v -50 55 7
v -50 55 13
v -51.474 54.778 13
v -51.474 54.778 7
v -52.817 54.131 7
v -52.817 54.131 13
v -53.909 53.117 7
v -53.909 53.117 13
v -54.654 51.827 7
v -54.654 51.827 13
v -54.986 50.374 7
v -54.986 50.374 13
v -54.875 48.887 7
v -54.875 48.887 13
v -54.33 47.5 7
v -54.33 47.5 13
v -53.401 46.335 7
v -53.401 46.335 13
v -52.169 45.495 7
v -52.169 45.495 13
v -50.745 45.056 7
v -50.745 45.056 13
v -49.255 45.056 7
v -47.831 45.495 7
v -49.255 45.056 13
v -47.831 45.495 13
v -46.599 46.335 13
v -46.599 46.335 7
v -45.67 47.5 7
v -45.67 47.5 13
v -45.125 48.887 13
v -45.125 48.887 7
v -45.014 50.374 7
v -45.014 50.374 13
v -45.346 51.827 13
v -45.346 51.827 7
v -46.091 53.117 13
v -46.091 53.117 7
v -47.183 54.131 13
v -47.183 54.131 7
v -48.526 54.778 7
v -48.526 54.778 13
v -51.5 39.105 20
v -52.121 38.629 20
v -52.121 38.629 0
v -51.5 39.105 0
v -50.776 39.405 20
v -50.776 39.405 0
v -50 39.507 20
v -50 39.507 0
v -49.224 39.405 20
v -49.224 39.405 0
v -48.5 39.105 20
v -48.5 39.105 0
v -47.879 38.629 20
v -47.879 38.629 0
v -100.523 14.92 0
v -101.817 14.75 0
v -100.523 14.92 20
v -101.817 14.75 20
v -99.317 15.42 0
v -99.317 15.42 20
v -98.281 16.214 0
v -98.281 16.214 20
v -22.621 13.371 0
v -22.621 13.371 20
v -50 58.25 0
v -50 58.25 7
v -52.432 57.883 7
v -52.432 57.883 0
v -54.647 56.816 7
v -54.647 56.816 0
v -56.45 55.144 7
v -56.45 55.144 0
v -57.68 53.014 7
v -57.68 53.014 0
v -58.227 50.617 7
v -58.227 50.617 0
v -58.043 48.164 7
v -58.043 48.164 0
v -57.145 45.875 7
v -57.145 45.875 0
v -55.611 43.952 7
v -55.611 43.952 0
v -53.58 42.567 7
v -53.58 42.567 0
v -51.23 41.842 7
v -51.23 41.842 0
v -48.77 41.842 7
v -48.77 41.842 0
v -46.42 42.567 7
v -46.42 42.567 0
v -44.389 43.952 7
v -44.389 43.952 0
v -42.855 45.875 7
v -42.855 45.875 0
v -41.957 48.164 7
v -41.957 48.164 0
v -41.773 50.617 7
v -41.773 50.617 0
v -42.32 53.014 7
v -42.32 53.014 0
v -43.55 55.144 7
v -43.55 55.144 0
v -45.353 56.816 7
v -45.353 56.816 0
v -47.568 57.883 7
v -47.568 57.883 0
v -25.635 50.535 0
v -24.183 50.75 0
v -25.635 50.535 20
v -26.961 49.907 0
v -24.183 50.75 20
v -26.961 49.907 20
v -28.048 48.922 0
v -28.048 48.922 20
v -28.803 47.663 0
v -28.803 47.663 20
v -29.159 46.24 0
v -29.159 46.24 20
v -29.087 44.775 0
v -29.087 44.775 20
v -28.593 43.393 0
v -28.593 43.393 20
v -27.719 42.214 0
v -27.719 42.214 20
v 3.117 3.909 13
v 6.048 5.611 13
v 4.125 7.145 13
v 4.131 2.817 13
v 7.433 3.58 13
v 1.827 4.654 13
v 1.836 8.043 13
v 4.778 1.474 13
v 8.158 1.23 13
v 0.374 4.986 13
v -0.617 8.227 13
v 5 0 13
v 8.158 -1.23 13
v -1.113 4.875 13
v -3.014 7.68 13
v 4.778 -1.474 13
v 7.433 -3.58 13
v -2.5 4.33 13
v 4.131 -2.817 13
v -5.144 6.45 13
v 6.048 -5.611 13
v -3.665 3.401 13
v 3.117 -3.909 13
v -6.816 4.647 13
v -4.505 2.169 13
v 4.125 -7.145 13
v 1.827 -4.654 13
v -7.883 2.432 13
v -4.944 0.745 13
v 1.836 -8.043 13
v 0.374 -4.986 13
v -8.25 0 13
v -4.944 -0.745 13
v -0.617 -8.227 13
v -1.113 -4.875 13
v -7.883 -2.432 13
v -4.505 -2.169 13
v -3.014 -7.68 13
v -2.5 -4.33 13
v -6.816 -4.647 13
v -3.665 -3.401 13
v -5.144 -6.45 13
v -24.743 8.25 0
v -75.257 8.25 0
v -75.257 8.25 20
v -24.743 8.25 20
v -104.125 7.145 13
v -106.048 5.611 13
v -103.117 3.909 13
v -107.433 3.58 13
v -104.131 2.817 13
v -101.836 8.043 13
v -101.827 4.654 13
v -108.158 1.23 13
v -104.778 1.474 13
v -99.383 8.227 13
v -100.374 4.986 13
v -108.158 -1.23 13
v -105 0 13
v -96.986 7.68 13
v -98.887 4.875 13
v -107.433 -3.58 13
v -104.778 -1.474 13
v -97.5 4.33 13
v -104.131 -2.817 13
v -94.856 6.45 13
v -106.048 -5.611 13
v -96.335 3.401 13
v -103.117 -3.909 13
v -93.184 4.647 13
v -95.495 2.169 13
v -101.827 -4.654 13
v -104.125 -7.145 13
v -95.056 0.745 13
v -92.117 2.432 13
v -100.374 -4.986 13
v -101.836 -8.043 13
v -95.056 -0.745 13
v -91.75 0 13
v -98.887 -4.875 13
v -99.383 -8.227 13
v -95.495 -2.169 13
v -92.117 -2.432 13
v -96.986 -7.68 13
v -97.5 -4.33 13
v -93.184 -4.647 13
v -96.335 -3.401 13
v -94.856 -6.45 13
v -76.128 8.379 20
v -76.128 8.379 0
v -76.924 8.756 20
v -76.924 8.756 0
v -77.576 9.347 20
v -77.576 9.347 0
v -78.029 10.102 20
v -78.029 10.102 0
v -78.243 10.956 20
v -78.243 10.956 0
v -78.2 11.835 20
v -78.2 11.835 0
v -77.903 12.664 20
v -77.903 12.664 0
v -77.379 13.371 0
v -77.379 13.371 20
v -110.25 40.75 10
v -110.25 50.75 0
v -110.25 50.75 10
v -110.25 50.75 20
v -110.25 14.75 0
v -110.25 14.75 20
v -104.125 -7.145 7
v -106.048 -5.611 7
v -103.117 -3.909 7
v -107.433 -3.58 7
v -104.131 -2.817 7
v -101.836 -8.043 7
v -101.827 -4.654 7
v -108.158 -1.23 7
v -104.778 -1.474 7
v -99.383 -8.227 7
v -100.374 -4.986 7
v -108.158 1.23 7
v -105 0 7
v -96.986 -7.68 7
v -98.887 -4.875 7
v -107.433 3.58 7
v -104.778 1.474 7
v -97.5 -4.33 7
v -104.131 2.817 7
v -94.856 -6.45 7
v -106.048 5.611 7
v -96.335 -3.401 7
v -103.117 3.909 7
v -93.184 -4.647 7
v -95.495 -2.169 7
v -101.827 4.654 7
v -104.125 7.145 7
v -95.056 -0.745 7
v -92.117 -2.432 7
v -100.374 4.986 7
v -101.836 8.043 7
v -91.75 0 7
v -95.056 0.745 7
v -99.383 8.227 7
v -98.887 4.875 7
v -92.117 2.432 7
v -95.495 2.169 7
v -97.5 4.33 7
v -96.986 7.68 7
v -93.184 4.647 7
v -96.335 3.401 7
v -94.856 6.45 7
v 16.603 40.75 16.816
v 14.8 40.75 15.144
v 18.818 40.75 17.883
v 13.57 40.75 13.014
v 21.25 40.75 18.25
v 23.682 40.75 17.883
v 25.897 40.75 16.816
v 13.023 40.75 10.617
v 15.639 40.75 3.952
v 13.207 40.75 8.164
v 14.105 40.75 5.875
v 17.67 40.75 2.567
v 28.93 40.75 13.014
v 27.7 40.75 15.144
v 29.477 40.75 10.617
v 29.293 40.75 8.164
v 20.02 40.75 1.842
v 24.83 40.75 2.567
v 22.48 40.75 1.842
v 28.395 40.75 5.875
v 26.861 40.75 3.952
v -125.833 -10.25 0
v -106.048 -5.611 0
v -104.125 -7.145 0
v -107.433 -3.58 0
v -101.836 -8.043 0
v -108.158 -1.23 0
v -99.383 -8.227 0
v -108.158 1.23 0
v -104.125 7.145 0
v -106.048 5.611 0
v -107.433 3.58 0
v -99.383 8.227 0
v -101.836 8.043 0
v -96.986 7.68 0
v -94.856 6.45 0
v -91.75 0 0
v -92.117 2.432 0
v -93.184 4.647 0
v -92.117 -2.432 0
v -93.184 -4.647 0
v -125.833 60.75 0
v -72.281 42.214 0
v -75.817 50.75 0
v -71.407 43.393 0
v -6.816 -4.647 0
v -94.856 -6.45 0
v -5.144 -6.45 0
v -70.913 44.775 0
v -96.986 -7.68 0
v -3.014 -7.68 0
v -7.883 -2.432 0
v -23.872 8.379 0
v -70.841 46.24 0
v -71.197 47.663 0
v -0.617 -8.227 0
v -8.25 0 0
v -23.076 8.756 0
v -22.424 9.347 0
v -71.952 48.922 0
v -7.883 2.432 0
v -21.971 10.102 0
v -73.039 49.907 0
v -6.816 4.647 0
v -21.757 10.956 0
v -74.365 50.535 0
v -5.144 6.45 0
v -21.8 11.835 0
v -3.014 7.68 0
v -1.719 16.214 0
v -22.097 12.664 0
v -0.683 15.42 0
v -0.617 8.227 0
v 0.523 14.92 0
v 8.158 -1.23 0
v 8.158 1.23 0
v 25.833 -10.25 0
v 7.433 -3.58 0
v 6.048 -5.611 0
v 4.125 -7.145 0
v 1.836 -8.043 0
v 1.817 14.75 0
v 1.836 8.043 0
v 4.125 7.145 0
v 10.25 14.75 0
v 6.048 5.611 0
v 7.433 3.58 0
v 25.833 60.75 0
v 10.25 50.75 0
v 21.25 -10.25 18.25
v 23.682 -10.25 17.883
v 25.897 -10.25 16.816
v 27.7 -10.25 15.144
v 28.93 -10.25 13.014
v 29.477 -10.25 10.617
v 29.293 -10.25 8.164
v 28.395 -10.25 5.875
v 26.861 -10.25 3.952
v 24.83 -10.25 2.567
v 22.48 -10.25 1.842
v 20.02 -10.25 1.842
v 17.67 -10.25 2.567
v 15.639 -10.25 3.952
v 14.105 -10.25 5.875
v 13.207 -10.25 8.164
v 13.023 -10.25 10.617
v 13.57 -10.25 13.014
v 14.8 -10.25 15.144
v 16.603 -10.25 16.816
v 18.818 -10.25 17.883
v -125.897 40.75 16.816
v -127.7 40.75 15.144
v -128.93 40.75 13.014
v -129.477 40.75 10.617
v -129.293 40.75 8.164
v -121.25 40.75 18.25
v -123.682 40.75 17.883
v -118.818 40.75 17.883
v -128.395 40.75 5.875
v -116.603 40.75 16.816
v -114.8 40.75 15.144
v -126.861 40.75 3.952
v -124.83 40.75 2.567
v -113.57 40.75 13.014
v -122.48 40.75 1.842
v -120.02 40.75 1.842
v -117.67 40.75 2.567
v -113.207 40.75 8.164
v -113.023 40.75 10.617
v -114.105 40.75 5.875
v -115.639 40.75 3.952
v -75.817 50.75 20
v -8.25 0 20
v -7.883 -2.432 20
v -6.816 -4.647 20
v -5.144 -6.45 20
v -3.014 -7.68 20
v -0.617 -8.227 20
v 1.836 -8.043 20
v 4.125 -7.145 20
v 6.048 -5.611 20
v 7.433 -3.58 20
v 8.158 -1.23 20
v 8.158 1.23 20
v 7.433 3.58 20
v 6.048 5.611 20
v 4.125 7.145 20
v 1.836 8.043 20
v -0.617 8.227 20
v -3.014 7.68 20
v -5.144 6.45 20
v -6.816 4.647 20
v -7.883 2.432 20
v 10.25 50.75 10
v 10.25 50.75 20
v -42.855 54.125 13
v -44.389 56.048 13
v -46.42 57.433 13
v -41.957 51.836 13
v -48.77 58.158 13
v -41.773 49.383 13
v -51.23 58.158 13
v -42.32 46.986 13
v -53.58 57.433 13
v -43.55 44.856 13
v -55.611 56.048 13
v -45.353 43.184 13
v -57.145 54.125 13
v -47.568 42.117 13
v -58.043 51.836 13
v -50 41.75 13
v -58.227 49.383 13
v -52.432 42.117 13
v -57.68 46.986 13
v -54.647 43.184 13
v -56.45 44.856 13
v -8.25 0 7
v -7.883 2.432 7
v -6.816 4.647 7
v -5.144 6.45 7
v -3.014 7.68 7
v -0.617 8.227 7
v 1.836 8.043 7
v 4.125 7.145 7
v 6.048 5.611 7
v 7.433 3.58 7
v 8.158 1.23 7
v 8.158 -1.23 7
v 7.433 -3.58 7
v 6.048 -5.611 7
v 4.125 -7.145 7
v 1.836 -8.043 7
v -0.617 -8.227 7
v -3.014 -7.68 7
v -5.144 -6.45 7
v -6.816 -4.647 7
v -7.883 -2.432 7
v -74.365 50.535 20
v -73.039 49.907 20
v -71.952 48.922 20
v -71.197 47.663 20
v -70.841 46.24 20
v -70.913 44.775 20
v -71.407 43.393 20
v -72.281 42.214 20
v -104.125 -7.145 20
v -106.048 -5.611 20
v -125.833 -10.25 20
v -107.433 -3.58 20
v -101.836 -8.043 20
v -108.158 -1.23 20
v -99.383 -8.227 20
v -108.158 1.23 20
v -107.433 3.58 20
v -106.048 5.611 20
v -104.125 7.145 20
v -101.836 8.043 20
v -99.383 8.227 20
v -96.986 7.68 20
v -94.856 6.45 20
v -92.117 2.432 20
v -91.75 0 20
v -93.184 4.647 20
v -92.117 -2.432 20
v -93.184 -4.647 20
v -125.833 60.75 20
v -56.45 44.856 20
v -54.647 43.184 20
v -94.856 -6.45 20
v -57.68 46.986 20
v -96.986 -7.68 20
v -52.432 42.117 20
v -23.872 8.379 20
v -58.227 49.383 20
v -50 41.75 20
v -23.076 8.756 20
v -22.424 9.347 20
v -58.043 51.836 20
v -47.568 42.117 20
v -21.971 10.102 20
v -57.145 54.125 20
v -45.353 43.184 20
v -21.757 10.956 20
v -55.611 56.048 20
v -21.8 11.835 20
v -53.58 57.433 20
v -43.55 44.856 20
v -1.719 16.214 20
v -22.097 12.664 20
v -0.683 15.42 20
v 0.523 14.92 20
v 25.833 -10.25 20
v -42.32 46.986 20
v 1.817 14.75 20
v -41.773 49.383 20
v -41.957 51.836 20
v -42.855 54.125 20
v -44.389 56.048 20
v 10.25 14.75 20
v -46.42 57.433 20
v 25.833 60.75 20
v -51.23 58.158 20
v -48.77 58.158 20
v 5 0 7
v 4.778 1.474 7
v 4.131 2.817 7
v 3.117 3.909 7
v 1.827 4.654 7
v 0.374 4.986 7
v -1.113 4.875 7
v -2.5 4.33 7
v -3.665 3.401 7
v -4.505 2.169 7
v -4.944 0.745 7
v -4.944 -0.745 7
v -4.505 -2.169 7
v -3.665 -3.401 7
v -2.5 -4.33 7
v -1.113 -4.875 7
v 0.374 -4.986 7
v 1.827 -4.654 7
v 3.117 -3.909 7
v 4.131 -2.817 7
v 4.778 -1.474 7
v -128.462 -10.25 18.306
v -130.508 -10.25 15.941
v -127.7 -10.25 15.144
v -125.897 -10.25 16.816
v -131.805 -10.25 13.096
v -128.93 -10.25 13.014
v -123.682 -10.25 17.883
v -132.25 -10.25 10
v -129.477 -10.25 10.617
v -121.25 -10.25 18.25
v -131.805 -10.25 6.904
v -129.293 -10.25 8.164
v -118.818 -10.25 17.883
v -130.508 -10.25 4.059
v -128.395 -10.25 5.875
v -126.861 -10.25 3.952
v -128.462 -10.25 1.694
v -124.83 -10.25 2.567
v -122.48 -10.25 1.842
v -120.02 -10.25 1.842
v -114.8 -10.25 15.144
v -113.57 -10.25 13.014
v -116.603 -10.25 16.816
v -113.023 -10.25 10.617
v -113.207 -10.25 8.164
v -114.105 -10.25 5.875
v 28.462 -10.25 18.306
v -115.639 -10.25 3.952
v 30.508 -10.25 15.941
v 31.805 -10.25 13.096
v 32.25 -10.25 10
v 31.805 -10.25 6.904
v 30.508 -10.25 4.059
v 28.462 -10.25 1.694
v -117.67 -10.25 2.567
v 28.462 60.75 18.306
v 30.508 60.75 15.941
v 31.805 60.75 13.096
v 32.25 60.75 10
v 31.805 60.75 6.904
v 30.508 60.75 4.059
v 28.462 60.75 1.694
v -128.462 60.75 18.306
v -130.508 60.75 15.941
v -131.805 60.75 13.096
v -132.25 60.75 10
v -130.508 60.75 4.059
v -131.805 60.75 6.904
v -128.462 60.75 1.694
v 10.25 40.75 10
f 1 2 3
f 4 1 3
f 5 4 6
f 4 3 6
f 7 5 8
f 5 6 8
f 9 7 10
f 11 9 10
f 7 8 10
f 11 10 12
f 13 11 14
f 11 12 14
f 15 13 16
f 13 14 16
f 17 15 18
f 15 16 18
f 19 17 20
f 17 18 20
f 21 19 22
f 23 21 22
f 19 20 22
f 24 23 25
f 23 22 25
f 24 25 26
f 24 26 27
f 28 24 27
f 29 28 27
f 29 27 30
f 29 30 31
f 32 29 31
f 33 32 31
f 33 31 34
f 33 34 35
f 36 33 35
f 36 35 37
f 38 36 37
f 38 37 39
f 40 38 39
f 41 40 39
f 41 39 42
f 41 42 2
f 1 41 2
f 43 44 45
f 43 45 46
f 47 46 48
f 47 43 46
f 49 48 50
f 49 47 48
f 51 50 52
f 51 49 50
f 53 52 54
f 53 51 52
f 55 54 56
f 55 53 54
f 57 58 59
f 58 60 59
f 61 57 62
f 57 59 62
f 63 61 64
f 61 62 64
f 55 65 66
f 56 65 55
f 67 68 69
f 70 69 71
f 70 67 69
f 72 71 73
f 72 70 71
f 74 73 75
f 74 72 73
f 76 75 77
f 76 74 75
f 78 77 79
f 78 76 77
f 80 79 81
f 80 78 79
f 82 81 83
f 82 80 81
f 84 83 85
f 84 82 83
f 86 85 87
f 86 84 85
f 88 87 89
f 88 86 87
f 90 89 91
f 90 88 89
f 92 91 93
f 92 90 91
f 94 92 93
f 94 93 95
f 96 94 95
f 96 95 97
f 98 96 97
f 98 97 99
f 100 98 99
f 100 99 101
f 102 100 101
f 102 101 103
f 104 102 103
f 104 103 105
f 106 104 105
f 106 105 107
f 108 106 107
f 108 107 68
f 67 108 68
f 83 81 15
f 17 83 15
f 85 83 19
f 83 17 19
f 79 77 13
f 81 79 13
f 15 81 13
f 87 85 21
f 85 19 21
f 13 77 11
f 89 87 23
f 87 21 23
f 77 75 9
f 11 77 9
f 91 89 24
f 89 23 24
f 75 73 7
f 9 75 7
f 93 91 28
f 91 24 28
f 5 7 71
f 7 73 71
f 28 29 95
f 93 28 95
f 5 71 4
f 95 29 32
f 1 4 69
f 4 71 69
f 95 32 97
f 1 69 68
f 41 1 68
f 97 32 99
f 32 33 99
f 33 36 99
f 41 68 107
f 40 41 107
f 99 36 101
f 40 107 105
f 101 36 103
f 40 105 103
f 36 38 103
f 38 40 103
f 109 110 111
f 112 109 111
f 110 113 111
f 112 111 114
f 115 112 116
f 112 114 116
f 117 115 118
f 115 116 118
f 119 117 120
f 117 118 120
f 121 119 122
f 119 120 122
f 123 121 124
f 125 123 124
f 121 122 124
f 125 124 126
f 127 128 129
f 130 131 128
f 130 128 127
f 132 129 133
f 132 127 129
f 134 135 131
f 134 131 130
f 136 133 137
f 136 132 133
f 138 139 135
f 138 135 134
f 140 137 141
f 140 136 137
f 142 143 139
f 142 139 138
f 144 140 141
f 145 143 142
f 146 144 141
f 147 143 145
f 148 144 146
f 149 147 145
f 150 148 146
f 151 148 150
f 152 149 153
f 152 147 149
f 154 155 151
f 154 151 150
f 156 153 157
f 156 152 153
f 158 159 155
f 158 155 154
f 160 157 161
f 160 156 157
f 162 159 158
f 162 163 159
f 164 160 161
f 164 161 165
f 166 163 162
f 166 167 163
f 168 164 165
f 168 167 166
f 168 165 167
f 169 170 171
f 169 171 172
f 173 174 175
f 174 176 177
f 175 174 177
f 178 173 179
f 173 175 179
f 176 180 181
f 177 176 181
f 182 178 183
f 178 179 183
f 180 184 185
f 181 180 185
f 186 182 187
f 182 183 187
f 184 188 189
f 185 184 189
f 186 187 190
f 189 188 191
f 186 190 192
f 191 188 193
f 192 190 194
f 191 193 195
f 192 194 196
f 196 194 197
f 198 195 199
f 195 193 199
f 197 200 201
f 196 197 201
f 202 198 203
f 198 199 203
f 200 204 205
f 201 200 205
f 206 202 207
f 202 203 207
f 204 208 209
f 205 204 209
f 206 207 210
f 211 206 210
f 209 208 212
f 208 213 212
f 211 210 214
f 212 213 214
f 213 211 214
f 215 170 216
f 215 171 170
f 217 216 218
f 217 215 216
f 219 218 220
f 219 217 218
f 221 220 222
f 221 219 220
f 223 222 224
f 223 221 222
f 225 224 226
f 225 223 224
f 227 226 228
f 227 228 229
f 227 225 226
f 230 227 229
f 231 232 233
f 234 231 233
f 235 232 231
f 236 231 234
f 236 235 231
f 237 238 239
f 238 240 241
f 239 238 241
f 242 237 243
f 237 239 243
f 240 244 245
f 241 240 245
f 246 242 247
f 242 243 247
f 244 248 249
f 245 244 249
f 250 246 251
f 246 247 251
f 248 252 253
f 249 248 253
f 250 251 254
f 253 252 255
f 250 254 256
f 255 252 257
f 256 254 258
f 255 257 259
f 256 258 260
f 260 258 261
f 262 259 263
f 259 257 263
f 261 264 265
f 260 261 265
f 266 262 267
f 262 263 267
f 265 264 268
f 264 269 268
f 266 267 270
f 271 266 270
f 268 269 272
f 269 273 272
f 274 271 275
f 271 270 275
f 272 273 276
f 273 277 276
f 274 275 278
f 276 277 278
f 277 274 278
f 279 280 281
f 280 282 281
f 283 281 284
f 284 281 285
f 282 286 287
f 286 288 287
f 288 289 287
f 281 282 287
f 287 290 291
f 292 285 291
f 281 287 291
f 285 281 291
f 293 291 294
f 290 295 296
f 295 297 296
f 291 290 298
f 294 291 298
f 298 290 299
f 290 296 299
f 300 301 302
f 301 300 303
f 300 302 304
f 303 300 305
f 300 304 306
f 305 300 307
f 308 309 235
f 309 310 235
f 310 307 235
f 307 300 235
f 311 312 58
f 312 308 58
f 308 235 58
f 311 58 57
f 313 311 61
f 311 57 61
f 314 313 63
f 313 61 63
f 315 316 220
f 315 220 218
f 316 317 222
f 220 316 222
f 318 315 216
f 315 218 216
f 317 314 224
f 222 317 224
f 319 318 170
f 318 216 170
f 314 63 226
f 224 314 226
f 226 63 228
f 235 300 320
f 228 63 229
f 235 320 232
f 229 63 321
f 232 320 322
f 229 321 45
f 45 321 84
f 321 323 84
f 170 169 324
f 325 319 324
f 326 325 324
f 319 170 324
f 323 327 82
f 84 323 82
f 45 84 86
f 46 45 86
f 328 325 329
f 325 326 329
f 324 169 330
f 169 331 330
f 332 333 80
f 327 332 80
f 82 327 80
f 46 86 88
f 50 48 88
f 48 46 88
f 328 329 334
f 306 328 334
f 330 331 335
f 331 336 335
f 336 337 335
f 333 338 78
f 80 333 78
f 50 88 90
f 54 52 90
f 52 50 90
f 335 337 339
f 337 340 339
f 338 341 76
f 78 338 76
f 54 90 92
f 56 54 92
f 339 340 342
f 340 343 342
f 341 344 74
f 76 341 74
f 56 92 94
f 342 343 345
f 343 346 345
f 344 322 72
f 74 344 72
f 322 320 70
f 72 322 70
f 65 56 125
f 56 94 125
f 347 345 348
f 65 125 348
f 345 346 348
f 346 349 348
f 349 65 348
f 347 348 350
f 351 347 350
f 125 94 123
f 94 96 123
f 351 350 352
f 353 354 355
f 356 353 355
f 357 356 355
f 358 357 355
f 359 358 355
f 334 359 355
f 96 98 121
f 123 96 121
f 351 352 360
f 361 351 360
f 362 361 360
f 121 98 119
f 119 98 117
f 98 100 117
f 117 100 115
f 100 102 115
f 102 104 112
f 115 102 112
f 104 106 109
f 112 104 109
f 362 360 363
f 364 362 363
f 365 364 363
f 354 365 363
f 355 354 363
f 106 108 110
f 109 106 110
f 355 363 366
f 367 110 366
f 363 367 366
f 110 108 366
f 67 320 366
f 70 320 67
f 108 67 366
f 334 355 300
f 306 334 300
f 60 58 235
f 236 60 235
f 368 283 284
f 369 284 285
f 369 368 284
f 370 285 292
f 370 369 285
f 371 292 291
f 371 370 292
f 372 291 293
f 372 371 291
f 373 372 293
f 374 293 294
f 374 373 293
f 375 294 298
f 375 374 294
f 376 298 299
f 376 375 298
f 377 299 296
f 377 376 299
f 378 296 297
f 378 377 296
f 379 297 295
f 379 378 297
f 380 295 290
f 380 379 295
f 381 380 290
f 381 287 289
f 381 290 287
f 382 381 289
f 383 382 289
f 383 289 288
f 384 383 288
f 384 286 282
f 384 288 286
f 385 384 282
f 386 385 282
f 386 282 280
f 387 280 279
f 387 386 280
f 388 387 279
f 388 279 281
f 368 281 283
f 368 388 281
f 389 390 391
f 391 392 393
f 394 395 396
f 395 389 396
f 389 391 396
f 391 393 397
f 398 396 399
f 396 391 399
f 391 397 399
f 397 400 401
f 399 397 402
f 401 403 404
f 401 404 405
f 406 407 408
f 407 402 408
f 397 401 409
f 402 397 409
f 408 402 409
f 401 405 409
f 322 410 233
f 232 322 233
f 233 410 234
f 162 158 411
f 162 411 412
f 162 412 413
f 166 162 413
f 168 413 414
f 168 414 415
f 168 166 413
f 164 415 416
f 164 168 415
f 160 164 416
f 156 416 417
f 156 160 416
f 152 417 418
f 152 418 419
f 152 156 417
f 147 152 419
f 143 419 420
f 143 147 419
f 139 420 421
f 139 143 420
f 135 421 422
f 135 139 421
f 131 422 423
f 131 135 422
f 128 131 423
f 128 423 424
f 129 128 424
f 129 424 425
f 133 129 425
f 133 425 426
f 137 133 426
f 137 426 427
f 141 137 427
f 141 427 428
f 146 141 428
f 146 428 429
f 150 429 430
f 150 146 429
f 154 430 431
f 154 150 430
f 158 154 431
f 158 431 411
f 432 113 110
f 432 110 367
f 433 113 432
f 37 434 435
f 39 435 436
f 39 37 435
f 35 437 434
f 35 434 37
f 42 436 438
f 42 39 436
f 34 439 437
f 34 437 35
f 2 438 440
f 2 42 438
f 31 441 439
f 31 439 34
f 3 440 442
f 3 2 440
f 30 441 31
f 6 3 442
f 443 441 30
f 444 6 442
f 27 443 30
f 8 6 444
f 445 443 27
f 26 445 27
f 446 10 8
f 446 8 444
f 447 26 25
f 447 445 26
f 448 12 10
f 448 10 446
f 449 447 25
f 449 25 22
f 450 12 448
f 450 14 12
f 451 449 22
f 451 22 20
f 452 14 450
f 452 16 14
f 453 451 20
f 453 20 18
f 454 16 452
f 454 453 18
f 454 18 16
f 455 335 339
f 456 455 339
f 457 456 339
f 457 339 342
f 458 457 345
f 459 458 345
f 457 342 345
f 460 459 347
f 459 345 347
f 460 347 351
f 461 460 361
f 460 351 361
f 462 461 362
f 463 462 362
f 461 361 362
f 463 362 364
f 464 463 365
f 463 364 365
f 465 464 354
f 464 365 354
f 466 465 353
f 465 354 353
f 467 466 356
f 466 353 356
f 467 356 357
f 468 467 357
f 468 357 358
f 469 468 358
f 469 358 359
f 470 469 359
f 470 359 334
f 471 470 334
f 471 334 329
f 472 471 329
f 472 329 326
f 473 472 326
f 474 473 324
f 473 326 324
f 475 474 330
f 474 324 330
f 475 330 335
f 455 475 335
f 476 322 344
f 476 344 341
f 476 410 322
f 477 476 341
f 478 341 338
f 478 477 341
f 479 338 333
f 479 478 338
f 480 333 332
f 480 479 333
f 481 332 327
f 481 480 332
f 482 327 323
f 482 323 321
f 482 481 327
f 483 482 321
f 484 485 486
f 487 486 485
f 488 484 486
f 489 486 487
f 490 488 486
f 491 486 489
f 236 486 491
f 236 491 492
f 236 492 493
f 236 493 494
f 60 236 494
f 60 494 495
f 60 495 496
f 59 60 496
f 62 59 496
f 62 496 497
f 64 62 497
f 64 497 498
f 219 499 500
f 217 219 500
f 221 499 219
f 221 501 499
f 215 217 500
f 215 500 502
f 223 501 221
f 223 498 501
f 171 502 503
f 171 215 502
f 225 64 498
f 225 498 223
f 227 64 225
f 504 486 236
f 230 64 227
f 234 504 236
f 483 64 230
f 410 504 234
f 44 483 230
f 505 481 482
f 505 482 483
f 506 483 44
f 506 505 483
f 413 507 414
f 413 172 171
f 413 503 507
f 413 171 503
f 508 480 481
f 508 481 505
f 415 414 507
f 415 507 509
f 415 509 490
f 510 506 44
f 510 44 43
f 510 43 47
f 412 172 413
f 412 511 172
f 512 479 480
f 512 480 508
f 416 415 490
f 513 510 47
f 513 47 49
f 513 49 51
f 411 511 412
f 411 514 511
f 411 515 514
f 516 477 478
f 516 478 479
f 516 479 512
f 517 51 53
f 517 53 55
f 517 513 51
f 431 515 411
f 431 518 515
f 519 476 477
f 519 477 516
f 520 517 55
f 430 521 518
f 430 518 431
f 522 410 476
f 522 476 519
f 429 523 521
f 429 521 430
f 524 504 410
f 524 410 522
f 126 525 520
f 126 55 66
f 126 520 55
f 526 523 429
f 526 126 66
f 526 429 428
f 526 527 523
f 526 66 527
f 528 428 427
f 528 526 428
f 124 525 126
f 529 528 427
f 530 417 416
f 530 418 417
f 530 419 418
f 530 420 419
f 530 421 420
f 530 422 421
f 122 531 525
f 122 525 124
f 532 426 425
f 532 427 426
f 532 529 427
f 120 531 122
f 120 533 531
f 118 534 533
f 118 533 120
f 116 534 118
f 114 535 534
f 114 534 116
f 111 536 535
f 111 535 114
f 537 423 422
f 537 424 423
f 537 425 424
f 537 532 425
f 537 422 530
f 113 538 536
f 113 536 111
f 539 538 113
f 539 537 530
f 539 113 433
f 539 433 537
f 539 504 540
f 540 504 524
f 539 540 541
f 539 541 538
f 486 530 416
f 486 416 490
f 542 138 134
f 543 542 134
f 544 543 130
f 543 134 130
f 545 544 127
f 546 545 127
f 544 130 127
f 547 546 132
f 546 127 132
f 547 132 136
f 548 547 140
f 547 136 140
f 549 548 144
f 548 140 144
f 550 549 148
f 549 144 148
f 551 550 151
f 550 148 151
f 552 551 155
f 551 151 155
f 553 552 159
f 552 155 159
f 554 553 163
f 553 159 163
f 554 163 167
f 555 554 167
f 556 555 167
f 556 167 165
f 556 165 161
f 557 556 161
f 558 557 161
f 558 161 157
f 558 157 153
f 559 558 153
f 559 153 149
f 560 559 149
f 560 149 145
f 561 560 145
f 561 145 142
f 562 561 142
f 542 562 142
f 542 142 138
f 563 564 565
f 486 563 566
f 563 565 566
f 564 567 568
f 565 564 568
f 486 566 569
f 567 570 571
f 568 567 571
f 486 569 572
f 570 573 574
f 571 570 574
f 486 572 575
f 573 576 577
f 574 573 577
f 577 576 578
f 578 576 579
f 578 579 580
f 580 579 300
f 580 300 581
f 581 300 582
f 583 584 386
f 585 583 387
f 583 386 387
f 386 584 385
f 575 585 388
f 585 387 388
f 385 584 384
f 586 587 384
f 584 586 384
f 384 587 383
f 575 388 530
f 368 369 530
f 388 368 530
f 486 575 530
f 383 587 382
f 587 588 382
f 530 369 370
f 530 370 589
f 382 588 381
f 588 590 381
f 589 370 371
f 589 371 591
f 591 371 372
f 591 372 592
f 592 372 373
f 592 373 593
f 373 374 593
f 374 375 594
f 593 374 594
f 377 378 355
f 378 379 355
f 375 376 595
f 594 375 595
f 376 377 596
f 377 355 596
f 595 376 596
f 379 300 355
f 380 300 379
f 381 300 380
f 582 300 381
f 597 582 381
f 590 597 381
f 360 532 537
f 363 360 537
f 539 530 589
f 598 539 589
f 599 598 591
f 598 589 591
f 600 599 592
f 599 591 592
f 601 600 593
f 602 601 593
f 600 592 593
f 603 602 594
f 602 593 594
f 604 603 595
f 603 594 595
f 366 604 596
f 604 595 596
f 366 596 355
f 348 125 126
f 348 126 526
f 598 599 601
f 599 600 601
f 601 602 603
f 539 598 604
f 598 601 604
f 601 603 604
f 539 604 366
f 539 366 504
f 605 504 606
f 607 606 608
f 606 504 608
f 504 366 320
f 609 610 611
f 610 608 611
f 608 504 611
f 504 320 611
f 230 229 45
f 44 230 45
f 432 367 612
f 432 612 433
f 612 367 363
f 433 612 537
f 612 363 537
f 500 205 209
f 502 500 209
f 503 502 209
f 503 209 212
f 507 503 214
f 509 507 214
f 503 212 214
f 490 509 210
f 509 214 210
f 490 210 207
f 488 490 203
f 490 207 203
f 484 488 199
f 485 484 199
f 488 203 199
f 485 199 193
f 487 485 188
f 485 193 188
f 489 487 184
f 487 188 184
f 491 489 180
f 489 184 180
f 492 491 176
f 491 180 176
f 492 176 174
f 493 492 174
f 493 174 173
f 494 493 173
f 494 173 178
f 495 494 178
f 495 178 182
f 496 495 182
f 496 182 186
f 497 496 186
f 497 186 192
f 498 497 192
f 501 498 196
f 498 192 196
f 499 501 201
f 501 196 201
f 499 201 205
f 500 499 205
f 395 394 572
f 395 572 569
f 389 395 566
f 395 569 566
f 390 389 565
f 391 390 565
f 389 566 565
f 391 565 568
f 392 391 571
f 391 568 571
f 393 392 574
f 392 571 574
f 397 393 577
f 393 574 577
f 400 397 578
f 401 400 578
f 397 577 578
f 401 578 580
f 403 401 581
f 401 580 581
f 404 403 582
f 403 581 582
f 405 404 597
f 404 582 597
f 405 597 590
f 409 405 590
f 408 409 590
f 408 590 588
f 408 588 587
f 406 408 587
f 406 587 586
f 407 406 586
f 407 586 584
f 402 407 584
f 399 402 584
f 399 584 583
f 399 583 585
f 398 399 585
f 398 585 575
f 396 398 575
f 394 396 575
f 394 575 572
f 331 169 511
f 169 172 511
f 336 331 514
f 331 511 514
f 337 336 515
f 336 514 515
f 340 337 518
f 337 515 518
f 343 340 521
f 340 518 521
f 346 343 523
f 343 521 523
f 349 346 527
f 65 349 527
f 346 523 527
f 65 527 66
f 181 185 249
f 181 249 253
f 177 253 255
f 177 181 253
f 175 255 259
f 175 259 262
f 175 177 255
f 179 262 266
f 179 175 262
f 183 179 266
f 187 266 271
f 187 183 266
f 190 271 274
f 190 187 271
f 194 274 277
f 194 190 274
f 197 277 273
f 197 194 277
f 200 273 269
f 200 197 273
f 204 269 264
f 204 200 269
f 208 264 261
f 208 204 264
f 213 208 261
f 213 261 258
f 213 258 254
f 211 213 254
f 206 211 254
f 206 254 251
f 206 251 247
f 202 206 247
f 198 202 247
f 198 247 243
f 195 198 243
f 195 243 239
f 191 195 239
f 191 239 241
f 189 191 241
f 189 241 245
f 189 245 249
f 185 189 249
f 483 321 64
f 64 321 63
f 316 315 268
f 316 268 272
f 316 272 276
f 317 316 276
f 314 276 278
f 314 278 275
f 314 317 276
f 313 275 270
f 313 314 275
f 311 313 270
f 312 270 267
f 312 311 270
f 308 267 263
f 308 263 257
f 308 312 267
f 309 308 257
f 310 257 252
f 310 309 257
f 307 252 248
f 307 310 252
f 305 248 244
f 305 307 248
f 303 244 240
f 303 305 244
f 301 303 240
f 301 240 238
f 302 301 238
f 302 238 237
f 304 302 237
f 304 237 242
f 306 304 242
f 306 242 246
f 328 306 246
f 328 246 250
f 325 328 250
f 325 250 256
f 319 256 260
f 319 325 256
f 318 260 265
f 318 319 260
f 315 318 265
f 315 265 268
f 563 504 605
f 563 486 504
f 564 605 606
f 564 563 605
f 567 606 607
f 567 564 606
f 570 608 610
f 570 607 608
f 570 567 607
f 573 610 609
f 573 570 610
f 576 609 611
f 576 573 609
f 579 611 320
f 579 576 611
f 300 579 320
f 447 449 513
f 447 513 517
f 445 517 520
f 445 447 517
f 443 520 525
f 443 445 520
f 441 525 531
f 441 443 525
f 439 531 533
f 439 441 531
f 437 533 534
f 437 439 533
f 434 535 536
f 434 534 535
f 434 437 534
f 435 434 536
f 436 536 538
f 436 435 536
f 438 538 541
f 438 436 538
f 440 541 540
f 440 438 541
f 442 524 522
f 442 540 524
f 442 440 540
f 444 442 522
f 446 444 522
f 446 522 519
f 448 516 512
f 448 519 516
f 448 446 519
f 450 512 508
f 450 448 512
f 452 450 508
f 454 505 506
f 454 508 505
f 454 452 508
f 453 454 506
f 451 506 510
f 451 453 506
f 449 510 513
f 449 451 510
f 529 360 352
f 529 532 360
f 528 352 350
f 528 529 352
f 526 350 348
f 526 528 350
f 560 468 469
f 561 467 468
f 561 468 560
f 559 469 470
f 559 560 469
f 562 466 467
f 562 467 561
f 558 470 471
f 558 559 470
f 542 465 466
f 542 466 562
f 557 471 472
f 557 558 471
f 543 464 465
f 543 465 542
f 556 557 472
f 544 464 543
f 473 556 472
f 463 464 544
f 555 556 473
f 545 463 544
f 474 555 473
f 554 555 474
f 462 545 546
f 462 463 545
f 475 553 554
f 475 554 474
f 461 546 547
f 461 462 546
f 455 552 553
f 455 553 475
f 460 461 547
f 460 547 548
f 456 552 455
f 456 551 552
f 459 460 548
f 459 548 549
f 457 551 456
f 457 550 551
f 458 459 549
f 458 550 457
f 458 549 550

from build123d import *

# Parameters (mm, degrees)
BOSS_EXTRUDE4_DEPTH      = 20
SKETCH3_R                = 8.25
CUT_EXTRUDE1_DEPTH       = 7
CUT_EXTRUDE2_START       = -7
SKETCH4_R                = 8.25
CUT_EXTRUDE2_DEPTH       = 7
CUT_EXTRUDE3_DEPTH       = 128.220772675
SKETCH6_R                = 5
CUT_EXTRUDE4_DEPTH       = 16.6
FILLET1_R                = 3
BOSS_EXTRUDE5_DEPTH      = 20
BOSS_EXTRUDE6_DEPTH      = 46
BOSS_EXTRUDE6_DEPTH_BACK = 25
SKETCH8_R                = 11
SKETCH8_R_2              = 8.25
BOSS_EXTRUDE7_REACH      = 138.572
SKETCH9_W                = 20
SKETCH9_H                = 10
FILLET2_R                = 5
FILLET5_R                = 5
SKETCH10_W               = 60.25
SKETCH10_H               = 70.5
CUT_EXTRUDE5_DEPTH       = 128.619062056
BOSS_EXTRUDE8_DEPTH      = 20
BOSS_EXTRUDE9_START      = -20
SKETCH12_R               = 11
BOSS_EXTRUDE9_DEPTH      = 20
SKETCH13_OUTSIDE_W       = 202.602
SKETCH13_OUTSIDE_H       = 60.102
SKETCH13_OUTSIDE_W_2     = 164.5
SKETCH13_OUTSIDE_H_2     = 20
CUT_EXTRUDE6_DEPTH       = 152.565373684


with BuildPart() as part:
    # Sketch2 → Boss-Extrude4 (new body)
    with BuildSketch(Plane.XY):
        with BuildLine():
            Line((-100, 10.25), (0, 10.25))
            ThreePointArc((0, 10.25), (10.25, 0), (0, -10.25))
            Line((0, -10.25), (-100, -10.25))
            ThreePointArc((-100, -10.25), (-110.25, 0), (-100, 10.25))
        make_face()
        with BuildLine():
            Line((-7.247844507, -7.247844507), (-57.247844507, 42.752155493))
            ThreePointArc((-57.247844507, 42.752155493), (-57.247844507, 57.247844507), (-42.752155493, 57.247844507))
            Line((-42.752155493, 57.247844507), (7.247844507, 7.247844507))
            ThreePointArc((7.247844507, 7.247844507), (7.247844507, -7.247844507), (-7.247844507, -7.247844507))
        make_face()
        with BuildLine():
            Line((-107.247844507, 7.247844507), (-57.247844507, 57.247844507))
            ThreePointArc((-57.247844507, 57.247844507), (-42.752155493, 57.247844507), (-42.752155493, 42.752155493))
            Line((-42.752155493, 42.752155493), (-92.752155493, -7.247844507))
            ThreePointArc((-92.752155493, -7.247844507), (-107.247844507, -7.247844507), (-107.247844507, 7.247844507))
        make_face()
    extrude(amount=BOSS_EXTRUDE4_DEPTH)

    # Sketch3 → Cut-Extrude1 (cut)
    with BuildSketch(Plane(origin=(0, 0, 0), x_dir=(-1, 0, 0), z_dir=(0, 0, -1))):
        Circle(SKETCH3_R)
        with Locations((50, 50)):
            Circle(SKETCH3_R)
        with Locations((100, 0)):
            Circle(SKETCH3_R)
    extrude(amount=-CUT_EXTRUDE1_DEPTH, mode=Mode.SUBTRACT)

    # Sketch4 → Cut-Extrude2 (cut)
    with BuildSketch(Plane.XY.offset(20).offset(CUT_EXTRUDE2_START)):
        with Locations(Location((-100, 0, 0), (0, 0, 180))):
            Circle(SKETCH4_R)
        with Locations(Location((-50, 50, 0), (0, 0, 180))):
            Circle(SKETCH4_R)
        with Locations(Location((0, 0, 0), (0, 0, 180))):
            Circle(SKETCH4_R)
    extrude(amount=CUT_EXTRUDE2_DEPTH, mode=Mode.SUBTRACT)

    # Sketch5 → Cut-Extrude3 (cut, through all)
    with BuildSketch(Plane(origin=(0, 0, 0), x_dir=(-1, 0, 0), z_dir=(0, 0, -1))):
        Polygon((17.5, 8.25), (50, 40.75), (82.5, 8.25), align=None)
    extrude(amount=-CUT_EXTRUDE3_DEPTH, mode=Mode.SUBTRACT)

    # Sketch6 → Cut-Extrude4 (cut)
    with BuildSketch(Plane.XY.offset(20)):
        with Locations((-100, 0)):
            Circle(SKETCH6_R)
        with Locations((-50, 50)):
            Circle(SKETCH6_R)
        Circle(SKETCH6_R)
    extrude(amount=-CUT_EXTRUDE4_DEPTH, mode=Mode.SUBTRACT)

    # Fillet1
    fillet1_edges = [part.edges().sort_by_distance(p)[0] for p in [
        (-82.5, 8.25, 10),
        (-17.5, 8.25, 10),
        (-50, 40.75, 10),
    ]]
    fillet(fillet1_edges, radius=FILLET1_R)

    # Sketch7 → Boss-Extrude5 (add)
    with BuildSketch(Plane(origin=(0, 0, 0), x_dir=(-1, 0, 0), z_dir=(0, 0, -1))):
        with BuildLine():
            Line((-10.25, 14.75), (-10.25, 0))
            ThreePointArc((-10.25, 0), (-9.469765208, 3.922505182), (-7.247844507, 7.247844507))
            Line((-7.247844507, 7.247844507), (0.254310986, 14.75))
            Line((0.254310986, 14.75), (-10.25, 14.75))
        make_face()
        with BuildLine():
            Line((-10.25, -10.25), (0, -10.25))
            ThreePointArc((0, -10.25), (-7.247844507, -7.247844507), (-10.25, 0))
            Line((-10.25, 0), (-10.25, -10.25))
        make_face()
    extrude(amount=-BOSS_EXTRUDE5_DEPTH)

    # Sketch8 → Boss-Extrude6 (add, two sides: drawn at the far end of the back side and taken through both)
    # profile 1 of 3: a face of its own
    with BuildSketch(Plane(origin=(0, 14.75, 0), x_dir=(1, 0, 0), z_dir=(0, 1, 0)).offset(-BOSS_EXTRUDE6_DEPTH_BACK)):
        with BuildLine():
            Line((10.25, 0), (10.25, -10))
            ThreePointArc((10.25, -10), (13.110659193, -2.600599266), (20.204751131, 0.950226244))
            Line((20.204751131, 0.950226244), (10.25, 0))
        make_face()
    # profile 2 of 3: a face of its own
    with BuildSketch(Plane(origin=(0, 14.75, 0), x_dir=(1, 0, 0), z_dir=(0, 1, 0)).offset(-BOSS_EXTRUDE6_DEPTH_BACK)):
        with Locations((21.25, -10)):
            Circle(SKETCH8_R)
        with Locations(Location((21.25, -10, 0), (0, 0, 270))):
            Circle(SKETCH8_R_2, mode=Mode.SUBTRACT)
    # profile 3 of 3: a face of its own
    with BuildSketch(Plane(origin=(0, 14.75, 0), x_dir=(1, 0, 0), z_dir=(0, 1, 0)).offset(-BOSS_EXTRUDE6_DEPTH_BACK)):
        with BuildLine():
            Line((10.25, -10), (10.25, -20))
            Line((10.25, -20), (20.204751131, -20.950226244))
            ThreePointArc((20.204751131, -20.950226244), (13.110659193, -17.399400734), (10.25, -10))
        make_face()
    extrude(amount=BOSS_EXTRUDE6_DEPTH + BOSS_EXTRUDE6_DEPTH_BACK)

    # Boss-Extrude7: up to this plane
    boss_extrude7_end = Plane(origin=(7.247844507, 7.247844507, 20), z_dir=(-0.7071067811865439, -0.7071067811865512, 0))
    # Sketch9 → Boss-Extrude7 (add, up to the surface)
    with BuildSketch(Plane.ZY.offset(-10.25), mode=Mode.PRIVATE) as boss_extrude7_sk1:
        with Locations((10, 55.75)):
            Rectangle(SKETCH9_W, SKETCH9_H)
    boss_extrude7_tool1 = split(extrude(boss_extrude7_sk1.sketch, amount=BOSS_EXTRUDE7_REACH, mode=Mode.PRIVATE), bisect_by=boss_extrude7_end, keep=Keep.BOTH, mode=Mode.PRIVATE)
    add(boss_extrude7_tool1.solids().sort_by_distance((10.25, 55.75, 10))[0])

    # Fillet2
    # the kernel refuses this fillet: 5 mm, written as the material it adds along each edge
    with BuildSketch(Plane(origin=(10.25, 14.75, 0), x_dir=(-1, 0, 0), z_dir=(0, -1, 0)), Plane(origin=(10.25, -10.25, 20), x_dir=(-1, 0, 0), z_dir=(0, 1, 0))) as fillet2_piece_1:
        with BuildLine():
            CenterArc((FILLET2_R * 0.047619047619, FILLET2_R), FILLET2_R, 264.547378012, 5.452621988)
            Line((-FILLET2_R * 0.0474035768153, FILLET2_R * 0.00452488687783), (0, 0))
            Line((0, 0), (FILLET2_R * 0.047619047619, 0))
        make_face()
    extrude(amount=25)
    with BuildSketch(Plane(origin=(10.25, 50.75, 0), x_dir=(-1, 0, 0), z_dir=(0, 1, 0)), Plane(origin=(10.25, 60.75, 20), x_dir=(-1, 0, 0), z_dir=(0, -1, 0))) as fillet2_piece_2:
        with BuildLine():
            CenterArc((FILLET2_R * 0.047619047619, -FILLET2_R), FILLET2_R, 90, 5.452621988)
            Line((-FILLET2_R * 0.0474035768153, -FILLET2_R * 0.00452488687783), (0, 0))
            Line((0, 0), (FILLET2_R * 0.047619047619, 0))
        make_face()
    extrude(amount=10)

    # Fillet5
    fillet5_edges = [part.edges().sort_by_distance(p)[0] for p in [
        (-0.254310986, 14.75, 10),
        (-36.254310986, 50.75, 10),
    ]]
    fillet(fillet5_edges, radius=FILLET5_R)

    # Sketch10 → Cut-Extrude5 (cut, through all)
    with BuildSketch(Plane(origin=(0, 0, 0), x_dir=(-1, 0, 0), z_dir=(0, 0, -1))):
        with Locations((80.125, 25)):
            Rectangle(SKETCH10_W, SKETCH10_H)
    extrude(amount=-CUT_EXTRUDE5_DEPTH, mode=Mode.SUBTRACT)

    # Mirror1: part across plane


with BuildPart() as part_1:
    add(part.part)
    add(part.part.mirror(Plane(origin=(-50, -10.25, 21), x_dir=(0, 0, 1), z_dir=(1, 0, 0))))

    # Sketch11 → Boss-Extrude8 (add)
    with BuildSketch(Plane(origin=(0, 0, 0), x_dir=(-1, 0, 0), z_dir=(0, 0, -1))):
        with BuildLine():
            Line((46.254310986, 60.75), (53.745689014, 60.75))
            Line((53.745689014, 60.75), (57.247844507, 57.247844507))
            ThreePointArc((57.247844507, 57.247844507), (50, 60.25), (42.752155493, 57.247844507))
            Line((42.752155493, 57.247844507), (46.254310986, 60.75))
        make_face()
    extrude(amount=-BOSS_EXTRUDE8_DEPTH)

    # Sketch12 → Boss-Extrude9 (add)
    with BuildSketch(Plane(origin=(0, 60.75, 0), x_dir=(1, 0, 0), z_dir=(0, 1, 0)).offset(BOSS_EXTRUDE9_START)):
        with Locations((-121.25, -10)):
            Circle(SKETCH12_R)
        with Locations((21.25, -10)):
            Circle(SKETCH12_R)
    extrude(amount=BOSS_EXTRUDE9_DEPTH)

    # Sketch13 outside → Cut-Extrude6 (cut, through all)
    with BuildSketch(Plane(origin=(0, 60.75, 0), x_dir=(1, 0, 0), z_dir=(0, 1, 0))):
        with Locations((-50, -10)):
            Rectangle(SKETCH13_OUTSIDE_W, SKETCH13_OUTSIDE_H)
        with Locations((-50, -10)):
            Rectangle(SKETCH13_OUTSIDE_W_2, SKETCH13_OUTSIDE_H_2, mode=Mode.SUBTRACT)
    extrude(amount=-CUT_EXTRUDE6_DEPTH, mode=Mode.SUBTRACT)


solid = part_1.part
